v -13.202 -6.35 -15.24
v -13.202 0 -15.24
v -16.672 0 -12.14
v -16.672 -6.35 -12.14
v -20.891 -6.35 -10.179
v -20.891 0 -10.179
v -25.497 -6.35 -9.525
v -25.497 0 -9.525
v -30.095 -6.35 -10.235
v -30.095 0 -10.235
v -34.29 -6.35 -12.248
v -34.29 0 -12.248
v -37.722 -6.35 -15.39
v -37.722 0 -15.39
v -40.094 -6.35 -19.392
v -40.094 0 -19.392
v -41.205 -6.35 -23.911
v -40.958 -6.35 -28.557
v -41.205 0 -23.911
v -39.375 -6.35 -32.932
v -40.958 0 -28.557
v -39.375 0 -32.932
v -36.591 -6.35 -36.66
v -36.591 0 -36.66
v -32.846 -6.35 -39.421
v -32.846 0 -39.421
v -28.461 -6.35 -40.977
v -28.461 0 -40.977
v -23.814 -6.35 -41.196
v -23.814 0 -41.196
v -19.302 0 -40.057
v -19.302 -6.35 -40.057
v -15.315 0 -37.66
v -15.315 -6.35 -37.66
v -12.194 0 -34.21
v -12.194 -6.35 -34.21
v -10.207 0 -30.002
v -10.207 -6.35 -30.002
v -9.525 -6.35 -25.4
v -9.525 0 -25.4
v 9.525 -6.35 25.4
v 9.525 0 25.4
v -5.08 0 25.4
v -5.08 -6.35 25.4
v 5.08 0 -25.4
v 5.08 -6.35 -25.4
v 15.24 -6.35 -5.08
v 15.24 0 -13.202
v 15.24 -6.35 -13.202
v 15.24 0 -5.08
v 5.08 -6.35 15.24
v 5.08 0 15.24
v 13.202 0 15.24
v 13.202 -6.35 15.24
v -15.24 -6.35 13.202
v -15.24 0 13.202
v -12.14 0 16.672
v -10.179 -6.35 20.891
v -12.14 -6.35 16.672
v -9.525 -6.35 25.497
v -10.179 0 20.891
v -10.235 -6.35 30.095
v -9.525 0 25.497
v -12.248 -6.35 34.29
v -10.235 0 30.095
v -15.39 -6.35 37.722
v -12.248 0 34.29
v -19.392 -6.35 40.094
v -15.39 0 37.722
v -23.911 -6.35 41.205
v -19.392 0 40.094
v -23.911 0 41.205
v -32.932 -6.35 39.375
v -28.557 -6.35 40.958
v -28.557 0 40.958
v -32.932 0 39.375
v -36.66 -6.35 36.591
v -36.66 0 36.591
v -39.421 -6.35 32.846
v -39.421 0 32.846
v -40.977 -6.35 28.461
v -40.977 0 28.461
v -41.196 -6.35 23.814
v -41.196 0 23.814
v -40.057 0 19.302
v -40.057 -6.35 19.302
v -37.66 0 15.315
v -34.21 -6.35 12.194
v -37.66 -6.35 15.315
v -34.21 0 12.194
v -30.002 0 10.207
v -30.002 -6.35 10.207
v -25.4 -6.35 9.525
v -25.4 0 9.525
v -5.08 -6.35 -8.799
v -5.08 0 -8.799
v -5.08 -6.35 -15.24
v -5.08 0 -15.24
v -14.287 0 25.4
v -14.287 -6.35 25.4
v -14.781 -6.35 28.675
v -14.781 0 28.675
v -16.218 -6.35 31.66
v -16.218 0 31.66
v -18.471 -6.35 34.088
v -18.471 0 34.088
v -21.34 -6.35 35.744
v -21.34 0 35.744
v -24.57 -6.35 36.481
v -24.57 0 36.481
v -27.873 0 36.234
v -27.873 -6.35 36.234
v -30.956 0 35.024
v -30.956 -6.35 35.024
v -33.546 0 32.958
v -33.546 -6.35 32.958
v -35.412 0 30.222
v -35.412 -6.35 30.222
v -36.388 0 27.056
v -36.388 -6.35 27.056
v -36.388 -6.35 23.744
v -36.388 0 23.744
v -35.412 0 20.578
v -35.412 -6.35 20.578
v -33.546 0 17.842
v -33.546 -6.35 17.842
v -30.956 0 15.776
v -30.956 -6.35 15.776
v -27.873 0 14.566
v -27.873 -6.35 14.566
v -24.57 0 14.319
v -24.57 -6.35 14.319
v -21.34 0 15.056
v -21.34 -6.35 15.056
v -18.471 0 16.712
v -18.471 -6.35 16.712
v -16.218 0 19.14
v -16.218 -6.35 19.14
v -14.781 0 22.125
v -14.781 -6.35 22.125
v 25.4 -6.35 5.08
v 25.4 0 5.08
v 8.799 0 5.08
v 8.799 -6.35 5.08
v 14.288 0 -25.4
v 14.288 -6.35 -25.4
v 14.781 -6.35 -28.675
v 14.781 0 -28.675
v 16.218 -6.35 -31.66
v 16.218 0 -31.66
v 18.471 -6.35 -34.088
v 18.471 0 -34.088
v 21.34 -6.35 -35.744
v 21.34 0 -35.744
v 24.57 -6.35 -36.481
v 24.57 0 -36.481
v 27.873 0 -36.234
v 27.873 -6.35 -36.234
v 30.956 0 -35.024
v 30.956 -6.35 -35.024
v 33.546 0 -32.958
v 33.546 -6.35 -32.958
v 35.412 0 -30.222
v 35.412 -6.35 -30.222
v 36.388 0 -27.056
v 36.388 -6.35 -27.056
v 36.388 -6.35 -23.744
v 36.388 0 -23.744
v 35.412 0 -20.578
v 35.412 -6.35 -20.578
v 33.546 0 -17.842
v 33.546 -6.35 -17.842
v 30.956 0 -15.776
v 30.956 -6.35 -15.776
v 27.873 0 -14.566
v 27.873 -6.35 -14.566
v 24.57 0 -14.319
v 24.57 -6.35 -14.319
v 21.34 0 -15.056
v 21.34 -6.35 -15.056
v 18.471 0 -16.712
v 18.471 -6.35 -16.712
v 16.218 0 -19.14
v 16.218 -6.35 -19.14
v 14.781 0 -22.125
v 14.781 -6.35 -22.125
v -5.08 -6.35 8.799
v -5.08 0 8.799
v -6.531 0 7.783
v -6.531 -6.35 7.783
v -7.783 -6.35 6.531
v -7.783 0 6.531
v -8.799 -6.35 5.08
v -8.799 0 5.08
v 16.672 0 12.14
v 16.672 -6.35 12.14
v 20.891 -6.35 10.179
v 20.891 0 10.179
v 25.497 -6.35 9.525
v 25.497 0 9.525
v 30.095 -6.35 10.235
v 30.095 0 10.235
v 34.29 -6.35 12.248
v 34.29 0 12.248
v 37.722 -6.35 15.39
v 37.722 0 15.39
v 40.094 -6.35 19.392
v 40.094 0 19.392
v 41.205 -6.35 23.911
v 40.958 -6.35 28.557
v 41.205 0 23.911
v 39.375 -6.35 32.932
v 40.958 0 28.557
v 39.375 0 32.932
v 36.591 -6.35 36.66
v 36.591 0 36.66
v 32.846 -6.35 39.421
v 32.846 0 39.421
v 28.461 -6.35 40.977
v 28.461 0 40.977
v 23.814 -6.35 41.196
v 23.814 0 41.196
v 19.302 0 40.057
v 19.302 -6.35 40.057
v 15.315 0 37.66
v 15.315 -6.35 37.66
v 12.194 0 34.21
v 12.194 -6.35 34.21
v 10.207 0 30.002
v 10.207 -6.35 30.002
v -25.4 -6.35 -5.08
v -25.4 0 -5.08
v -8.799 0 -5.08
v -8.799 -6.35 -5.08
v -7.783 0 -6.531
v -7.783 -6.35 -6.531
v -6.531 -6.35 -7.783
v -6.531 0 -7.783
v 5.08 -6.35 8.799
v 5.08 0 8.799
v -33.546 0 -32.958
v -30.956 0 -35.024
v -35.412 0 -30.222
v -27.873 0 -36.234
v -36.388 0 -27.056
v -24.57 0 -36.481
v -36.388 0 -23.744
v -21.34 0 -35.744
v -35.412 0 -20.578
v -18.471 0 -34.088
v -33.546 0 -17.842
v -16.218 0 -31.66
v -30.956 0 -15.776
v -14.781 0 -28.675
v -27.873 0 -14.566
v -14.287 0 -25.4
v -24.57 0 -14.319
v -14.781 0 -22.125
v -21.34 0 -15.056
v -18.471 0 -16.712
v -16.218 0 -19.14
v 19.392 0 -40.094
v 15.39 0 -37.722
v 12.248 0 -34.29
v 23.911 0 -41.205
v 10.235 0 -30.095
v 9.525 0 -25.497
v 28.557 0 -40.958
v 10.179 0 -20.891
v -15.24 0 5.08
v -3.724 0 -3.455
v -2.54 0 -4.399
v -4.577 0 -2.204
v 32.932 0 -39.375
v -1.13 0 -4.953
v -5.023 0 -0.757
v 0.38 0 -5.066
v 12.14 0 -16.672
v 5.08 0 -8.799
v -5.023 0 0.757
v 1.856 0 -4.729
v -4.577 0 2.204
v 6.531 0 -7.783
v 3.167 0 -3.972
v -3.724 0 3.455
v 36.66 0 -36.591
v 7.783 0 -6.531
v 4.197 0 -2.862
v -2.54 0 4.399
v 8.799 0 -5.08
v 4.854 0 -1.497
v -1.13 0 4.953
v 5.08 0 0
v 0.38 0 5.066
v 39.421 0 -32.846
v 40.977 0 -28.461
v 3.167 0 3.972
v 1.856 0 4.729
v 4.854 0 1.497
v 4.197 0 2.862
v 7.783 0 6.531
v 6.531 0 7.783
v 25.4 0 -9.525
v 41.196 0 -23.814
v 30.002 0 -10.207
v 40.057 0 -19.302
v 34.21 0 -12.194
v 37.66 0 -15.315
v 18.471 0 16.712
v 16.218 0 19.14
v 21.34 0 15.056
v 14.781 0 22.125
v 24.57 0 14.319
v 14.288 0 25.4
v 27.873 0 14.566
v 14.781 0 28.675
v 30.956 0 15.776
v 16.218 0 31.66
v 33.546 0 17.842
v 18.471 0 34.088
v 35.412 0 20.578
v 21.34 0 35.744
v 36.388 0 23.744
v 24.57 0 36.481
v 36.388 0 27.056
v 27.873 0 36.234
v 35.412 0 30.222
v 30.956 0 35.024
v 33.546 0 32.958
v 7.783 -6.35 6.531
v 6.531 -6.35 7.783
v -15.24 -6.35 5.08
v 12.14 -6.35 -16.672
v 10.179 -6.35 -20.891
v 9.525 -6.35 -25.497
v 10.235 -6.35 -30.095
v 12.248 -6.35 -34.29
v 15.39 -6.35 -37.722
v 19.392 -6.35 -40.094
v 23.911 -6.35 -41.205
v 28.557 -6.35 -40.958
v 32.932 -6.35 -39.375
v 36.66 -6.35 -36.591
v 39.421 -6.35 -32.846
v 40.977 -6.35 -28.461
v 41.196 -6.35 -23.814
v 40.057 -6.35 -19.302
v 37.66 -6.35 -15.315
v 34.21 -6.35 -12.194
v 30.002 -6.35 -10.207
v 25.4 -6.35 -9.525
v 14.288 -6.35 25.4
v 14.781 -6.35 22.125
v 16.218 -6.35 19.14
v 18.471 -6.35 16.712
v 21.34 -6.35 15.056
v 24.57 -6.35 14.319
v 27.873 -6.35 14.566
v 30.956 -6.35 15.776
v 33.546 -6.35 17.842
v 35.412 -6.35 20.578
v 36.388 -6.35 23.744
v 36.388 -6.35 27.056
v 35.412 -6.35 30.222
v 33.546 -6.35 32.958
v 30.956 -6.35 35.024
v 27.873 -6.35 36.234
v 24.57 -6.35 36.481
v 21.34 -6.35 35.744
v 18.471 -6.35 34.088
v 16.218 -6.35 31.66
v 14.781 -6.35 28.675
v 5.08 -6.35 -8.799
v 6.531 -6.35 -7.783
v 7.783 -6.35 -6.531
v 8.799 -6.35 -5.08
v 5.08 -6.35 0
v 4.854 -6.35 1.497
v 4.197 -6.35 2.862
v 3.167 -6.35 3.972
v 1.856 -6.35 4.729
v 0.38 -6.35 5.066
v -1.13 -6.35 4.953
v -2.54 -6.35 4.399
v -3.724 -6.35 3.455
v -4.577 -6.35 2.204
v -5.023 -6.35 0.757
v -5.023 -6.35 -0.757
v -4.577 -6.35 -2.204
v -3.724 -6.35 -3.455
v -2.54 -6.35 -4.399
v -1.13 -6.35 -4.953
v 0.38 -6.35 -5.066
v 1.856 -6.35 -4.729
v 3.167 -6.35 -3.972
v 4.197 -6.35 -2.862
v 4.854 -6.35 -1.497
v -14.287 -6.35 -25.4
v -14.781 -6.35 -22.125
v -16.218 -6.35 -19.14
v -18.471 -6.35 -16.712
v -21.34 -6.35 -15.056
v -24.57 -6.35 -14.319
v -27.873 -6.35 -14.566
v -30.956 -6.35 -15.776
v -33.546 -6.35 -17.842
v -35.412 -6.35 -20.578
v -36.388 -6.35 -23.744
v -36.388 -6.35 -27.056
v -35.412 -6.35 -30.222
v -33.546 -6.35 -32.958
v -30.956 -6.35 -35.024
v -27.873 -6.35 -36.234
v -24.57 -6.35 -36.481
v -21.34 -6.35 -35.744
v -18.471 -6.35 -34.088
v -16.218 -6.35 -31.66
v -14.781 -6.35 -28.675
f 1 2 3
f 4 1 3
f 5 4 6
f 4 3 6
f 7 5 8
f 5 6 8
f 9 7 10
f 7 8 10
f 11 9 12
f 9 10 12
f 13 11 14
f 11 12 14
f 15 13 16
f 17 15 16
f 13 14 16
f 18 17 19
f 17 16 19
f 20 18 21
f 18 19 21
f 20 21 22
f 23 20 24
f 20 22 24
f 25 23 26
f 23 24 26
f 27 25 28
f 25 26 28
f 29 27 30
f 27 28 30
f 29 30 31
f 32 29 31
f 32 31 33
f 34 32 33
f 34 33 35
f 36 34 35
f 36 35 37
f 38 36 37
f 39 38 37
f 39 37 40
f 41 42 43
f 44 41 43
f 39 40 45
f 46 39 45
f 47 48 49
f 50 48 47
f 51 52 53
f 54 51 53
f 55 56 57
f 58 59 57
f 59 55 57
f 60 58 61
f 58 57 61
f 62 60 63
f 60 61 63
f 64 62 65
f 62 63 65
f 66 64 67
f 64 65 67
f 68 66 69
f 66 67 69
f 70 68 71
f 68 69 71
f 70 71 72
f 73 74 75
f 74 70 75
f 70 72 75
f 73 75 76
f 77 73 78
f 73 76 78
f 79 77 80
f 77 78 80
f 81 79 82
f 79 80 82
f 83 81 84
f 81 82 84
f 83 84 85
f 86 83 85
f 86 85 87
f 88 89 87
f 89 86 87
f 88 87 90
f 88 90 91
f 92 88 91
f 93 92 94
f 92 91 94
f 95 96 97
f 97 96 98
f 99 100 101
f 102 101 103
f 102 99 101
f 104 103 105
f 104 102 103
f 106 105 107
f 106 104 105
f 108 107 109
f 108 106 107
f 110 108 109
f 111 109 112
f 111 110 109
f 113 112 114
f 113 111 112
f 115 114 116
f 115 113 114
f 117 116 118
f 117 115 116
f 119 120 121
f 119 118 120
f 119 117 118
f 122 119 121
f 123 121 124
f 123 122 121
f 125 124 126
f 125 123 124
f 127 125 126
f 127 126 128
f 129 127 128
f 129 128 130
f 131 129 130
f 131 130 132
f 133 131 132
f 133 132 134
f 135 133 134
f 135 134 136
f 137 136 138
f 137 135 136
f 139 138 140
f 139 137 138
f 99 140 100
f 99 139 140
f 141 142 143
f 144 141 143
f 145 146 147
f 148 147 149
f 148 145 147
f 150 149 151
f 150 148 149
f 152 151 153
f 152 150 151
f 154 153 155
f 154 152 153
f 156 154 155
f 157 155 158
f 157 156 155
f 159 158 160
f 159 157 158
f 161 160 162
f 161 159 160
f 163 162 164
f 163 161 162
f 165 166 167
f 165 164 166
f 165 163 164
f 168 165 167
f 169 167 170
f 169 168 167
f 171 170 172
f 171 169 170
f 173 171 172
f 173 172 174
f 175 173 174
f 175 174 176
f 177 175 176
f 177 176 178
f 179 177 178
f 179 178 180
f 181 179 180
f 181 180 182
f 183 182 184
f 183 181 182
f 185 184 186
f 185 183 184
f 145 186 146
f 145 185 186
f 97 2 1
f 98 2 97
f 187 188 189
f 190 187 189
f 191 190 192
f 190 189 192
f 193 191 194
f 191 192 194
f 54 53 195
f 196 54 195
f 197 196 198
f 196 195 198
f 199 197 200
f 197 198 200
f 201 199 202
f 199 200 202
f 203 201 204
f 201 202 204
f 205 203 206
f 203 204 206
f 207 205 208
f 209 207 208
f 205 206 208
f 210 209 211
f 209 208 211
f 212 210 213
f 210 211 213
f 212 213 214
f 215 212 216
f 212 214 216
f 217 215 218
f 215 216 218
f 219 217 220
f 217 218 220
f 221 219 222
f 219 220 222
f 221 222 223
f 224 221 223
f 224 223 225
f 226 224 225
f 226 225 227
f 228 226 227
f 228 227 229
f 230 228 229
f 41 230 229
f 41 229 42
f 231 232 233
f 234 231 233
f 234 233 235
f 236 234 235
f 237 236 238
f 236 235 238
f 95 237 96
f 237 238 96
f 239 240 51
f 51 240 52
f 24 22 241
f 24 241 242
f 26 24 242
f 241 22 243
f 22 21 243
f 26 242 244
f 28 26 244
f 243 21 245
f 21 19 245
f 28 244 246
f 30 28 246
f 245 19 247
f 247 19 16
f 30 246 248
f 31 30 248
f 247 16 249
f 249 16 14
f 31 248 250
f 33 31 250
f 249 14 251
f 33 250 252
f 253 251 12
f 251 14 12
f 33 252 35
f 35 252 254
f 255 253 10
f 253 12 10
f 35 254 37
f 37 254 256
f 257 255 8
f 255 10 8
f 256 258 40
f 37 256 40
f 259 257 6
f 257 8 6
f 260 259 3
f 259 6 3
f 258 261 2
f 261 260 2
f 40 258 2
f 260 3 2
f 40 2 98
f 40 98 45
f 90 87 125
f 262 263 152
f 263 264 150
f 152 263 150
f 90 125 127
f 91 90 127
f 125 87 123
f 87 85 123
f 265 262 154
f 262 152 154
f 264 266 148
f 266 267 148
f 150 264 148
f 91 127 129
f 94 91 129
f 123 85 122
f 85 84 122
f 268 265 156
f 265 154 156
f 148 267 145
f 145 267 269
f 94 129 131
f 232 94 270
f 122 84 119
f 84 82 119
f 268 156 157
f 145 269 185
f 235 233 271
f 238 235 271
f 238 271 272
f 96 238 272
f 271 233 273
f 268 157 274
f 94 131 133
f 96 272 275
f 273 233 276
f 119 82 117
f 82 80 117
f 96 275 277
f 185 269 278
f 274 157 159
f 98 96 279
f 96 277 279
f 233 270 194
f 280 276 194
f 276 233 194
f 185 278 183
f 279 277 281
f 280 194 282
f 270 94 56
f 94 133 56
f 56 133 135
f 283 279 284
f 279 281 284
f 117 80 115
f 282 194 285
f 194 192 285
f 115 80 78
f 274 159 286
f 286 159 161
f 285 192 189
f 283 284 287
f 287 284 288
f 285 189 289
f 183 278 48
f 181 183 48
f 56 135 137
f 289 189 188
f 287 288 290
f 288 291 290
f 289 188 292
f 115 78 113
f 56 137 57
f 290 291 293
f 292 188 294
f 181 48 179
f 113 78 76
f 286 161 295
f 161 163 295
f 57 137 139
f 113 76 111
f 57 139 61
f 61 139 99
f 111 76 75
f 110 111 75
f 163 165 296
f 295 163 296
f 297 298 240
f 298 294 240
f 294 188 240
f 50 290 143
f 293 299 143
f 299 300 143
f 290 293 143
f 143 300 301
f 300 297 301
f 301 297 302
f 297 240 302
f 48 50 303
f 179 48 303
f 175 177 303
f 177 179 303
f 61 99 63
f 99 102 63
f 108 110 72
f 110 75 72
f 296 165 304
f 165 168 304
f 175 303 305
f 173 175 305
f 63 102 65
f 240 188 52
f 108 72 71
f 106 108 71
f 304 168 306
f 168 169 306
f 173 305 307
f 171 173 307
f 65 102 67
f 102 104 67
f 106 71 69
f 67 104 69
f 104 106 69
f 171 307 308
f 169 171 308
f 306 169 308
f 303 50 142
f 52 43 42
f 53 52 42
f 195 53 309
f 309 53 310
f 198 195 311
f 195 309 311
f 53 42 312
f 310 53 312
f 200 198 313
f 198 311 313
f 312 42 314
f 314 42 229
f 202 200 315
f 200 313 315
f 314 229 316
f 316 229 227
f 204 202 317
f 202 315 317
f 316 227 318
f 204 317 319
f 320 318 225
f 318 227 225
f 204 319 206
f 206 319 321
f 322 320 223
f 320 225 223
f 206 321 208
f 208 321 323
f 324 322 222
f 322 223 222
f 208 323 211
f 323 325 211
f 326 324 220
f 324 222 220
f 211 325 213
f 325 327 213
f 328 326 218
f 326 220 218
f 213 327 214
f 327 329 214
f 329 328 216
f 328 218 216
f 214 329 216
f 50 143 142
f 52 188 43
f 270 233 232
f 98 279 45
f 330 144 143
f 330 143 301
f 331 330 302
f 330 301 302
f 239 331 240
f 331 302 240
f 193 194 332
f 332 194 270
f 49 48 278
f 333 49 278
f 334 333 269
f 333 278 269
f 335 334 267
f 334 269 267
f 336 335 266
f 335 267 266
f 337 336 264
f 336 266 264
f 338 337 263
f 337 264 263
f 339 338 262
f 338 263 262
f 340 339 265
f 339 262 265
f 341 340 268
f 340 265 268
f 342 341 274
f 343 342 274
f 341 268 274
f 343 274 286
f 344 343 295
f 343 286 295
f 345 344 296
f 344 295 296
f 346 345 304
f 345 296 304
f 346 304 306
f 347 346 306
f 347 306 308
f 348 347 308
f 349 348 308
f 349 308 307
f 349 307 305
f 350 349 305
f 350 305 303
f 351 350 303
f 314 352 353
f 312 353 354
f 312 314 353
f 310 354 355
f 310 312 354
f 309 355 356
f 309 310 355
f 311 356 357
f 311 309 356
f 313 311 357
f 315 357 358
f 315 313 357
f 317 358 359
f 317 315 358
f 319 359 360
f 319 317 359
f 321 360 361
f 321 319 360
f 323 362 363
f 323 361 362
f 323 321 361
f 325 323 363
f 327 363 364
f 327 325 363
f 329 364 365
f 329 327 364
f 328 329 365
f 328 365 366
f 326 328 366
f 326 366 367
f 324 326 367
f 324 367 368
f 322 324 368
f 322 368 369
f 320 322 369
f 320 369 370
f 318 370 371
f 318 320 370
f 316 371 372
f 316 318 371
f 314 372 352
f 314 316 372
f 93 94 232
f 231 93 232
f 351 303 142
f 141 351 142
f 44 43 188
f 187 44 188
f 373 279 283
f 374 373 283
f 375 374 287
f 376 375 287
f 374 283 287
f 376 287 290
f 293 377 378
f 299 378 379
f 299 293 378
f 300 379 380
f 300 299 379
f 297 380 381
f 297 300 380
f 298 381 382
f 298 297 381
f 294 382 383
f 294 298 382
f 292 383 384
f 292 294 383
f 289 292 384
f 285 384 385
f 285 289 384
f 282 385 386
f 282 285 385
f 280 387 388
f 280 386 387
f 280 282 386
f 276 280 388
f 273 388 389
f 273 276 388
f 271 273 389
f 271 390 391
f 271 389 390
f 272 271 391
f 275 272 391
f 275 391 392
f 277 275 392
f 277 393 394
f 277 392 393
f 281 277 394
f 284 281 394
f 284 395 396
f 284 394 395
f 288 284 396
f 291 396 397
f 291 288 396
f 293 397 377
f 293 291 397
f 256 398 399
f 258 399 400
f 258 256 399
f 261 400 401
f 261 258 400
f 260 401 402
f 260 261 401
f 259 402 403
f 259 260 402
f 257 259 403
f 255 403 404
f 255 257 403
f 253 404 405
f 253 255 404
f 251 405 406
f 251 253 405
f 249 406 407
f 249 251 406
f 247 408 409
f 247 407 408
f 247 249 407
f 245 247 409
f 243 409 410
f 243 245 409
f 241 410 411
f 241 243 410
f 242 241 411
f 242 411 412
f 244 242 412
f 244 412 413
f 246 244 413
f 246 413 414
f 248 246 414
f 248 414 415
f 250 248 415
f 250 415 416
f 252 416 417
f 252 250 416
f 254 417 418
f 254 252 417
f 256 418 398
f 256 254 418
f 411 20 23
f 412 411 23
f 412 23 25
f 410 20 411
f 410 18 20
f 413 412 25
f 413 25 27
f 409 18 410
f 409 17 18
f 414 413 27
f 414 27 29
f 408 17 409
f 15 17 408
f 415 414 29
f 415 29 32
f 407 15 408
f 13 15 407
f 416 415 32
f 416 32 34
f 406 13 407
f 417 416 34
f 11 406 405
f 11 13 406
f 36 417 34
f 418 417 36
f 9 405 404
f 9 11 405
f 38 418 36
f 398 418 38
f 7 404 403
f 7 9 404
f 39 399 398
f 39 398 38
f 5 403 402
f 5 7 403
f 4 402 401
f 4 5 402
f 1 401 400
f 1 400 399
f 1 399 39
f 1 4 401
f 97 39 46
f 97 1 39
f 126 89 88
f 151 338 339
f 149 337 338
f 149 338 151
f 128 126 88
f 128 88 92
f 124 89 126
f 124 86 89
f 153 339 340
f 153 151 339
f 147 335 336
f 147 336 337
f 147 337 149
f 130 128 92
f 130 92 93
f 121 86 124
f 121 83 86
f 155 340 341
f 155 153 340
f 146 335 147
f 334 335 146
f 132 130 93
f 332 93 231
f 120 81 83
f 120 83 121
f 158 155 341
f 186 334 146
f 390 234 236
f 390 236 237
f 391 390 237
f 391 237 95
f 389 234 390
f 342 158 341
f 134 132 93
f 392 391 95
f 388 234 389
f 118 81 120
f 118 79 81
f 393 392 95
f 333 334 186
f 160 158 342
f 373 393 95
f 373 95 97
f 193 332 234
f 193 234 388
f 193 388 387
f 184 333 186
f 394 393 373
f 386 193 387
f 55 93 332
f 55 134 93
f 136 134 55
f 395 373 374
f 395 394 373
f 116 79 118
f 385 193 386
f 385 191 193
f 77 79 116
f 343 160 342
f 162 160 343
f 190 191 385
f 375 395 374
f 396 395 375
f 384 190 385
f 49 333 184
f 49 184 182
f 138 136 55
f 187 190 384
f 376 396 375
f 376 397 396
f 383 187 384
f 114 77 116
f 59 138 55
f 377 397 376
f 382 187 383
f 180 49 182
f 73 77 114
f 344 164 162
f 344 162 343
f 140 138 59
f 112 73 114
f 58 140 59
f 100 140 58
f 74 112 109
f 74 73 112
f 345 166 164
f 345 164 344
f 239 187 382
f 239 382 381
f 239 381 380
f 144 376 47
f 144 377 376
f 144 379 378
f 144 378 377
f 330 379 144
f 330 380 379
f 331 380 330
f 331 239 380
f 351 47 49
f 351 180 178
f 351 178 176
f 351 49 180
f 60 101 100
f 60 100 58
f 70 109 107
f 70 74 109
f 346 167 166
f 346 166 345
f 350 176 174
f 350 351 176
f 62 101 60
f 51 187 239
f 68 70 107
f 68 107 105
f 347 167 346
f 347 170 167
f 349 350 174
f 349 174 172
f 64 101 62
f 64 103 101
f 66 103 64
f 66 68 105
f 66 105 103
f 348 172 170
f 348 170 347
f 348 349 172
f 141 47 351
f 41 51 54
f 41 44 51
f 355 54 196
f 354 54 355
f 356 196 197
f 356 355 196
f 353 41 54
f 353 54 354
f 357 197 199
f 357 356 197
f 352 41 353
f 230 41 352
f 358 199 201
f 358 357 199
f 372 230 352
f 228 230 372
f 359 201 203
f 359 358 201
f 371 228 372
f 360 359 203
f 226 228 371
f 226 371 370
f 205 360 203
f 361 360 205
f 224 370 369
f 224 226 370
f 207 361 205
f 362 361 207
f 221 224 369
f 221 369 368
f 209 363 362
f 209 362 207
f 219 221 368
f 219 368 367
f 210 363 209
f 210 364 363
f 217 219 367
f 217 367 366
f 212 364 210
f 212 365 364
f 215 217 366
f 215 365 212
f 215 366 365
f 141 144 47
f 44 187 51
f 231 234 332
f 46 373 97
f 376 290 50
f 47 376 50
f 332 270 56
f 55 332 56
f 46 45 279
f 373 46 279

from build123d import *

# Parameters (mm, degrees)
F0_W     = 10.16
F0_H     = 20.32
F0_W_2   = 20.32
F0_H_2   = 10.16
F1_DEPTH = 6.35
F2_R     = 15.875
F3_DEPTH = 6.35
F4_R     = 11.1125
F5_DEPTH = 6.351
F6_R     = 10.16
F7_DEPTH = 6.35
F8_R     = 5.08
F9_DEPTH = 6.351


with BuildPart() as f1:
    # F0 (on Front) → F1 (new body)
    with BuildSketch(Plane.XZ):
        with Locations((20.32, -15.24)):
            Rectangle(F0_W, F0_H)
        Polygon((15.24, -5.08), (25.4, -5.08), (25.4, 5.08), (5.08, 5.08), (5.08, -5.08), align=None)
        Polygon((5.08, -25.4), (5.08, -5.08), (-5.08, -5.08), (-5.08, -15.24), (-5.08, -25.4), align=None)
        Polygon((-5.08, 5.08), (5.08, 5.08), (5.08, 15.24), (5.08, 25.4), (-5.08, 25.4), align=None)
        Polygon((-25.4, -5.08), (-5.08, -5.08), (-5.08, 5.08), (-15.24, 5.08), (-25.4, 5.08), align=None)
        with Locations((15.24, 20.32)):
            Rectangle(F0_W_2, F0_H_2)
        with Locations((-15.24, -20.32)):
            Rectangle(F0_W_2, F0_H_2)
        with Locations((-20.32, 15.24)):
            Rectangle(F0_W, F0_H)
    extrude(amount=F1_DEPTH)

    # F2 (on Front) → F3 (join)
    with BuildSketch(Plane.XZ):
        with Locations((-25.4, 25.4)):
            Circle(F2_R)
        with BuildLine():
            ThreePointArc((41.275, 25.4), (25.4, 41.275), (9.525, 25.4))
            ThreePointArc((9.525, 25.4), (25.4, 9.525), (41.275, 25.4))
        make_face()
        with BuildLine():
            ThreePointArc((41.275, -25.4), (25.4, -9.525), (9.525, -25.4))
            ThreePointArc((9.525, -25.4), (25.4, -41.275), (41.275, -25.4))
        make_face()
        with Locations((-25.4, -25.4)):
            Circle(F2_R)
    extrude(amount=F3_DEPTH)

    # F4 (on Front) → F5 (cut, through all)
    with BuildSketch(Plane.XZ):
        with Locations((-25.4, 25.4)):
            Circle(F4_R)
        with BuildLine():
            ThreePointArc((36.5125, 25.4), (25.4, 36.5125), (14.2875, 25.4))
            ThreePointArc((14.2875, 25.4), (25.4, 14.2875), (36.5125, 25.4))
        make_face()
        with BuildLine():
            ThreePointArc((36.5125, -25.4), (25.4, -14.2875), (14.2875, -25.4))
            ThreePointArc((14.2875, -25.4), (25.4, -36.5125), (36.5125, -25.4))
        make_face()
        with Locations((-25.4, -25.4)):
            Circle(F4_R)
    extrude(amount=F5_DEPTH, mode=Mode.SUBTRACT)

    # F6 (on Front) → F7 (join)
    with BuildSketch(Plane.XZ):
        Circle(F6_R)
    extrude(amount=F7_DEPTH)

    # F8 (on Front) → F9 (cut, through all)
    with BuildSketch(Plane.XZ):
        Circle(F8_R)
    extrude(amount=F9_DEPTH, mode=Mode.SUBTRACT)


solid = f1.part
